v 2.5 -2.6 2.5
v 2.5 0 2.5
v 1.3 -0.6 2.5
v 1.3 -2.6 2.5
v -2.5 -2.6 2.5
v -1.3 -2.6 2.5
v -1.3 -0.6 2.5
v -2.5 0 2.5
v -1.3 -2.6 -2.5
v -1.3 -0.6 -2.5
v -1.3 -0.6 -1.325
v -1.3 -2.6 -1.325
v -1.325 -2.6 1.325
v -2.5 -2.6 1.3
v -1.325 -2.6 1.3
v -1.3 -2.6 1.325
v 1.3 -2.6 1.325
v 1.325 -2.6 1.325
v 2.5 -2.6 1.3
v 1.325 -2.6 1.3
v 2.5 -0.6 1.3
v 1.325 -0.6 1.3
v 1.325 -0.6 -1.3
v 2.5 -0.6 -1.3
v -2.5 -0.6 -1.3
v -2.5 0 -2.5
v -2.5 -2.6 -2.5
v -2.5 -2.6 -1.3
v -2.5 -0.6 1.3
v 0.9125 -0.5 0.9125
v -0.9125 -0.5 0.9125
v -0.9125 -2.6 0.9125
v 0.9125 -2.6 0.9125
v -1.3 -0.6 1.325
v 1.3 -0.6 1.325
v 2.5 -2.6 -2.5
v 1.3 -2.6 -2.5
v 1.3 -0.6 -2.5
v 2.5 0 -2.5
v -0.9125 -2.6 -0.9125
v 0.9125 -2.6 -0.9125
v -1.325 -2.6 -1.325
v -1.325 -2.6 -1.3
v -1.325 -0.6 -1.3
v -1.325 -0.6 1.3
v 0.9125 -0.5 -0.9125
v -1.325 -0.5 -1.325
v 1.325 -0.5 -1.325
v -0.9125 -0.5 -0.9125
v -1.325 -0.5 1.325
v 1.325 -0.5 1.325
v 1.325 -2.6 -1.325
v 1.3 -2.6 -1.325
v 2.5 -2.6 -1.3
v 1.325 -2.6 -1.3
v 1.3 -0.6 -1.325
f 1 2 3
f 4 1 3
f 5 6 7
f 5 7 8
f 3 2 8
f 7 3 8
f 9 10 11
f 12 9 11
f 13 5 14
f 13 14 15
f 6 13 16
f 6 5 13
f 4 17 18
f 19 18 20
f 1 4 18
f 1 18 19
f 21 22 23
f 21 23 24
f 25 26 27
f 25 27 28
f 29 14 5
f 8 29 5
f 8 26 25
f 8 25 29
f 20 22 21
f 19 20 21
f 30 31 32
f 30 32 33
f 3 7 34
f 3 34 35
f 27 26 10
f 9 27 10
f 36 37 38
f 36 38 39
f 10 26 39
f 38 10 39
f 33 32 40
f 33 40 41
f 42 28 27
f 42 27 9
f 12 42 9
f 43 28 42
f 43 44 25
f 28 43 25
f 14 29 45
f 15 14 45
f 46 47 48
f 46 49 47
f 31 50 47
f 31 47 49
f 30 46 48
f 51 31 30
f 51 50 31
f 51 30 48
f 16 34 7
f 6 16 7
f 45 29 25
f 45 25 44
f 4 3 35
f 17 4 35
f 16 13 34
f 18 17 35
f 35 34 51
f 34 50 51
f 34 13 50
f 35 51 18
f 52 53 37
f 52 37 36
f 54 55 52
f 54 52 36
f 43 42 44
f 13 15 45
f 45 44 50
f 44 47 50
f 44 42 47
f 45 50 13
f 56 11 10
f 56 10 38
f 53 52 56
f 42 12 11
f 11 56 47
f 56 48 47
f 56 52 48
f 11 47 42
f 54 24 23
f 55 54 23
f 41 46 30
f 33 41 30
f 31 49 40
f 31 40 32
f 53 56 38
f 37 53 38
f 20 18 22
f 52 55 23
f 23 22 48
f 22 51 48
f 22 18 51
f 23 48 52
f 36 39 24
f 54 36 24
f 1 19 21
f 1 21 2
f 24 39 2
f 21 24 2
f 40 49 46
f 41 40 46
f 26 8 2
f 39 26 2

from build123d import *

# Parameters (mm, degrees)
F0_W      = 5
F0_H      = 5
F1_DEPTH  = 0.5
F2_W      = 1.825
F2_H      = 1.825
F3_DEPTH  = 2.1
F5_DEPTH  = 2.1
F6_W      = 2.6
F6_H      = 1.175
F7_DEPTH  = 0.1
F9_DEPTH  = 2.1
F10_W     = 1.175
F10_H     = 2.6
F11_DEPTH = 0.1
F13_DEPTH = 2.1
F14_W     = 2.6
F14_H     = 1.175
F15_DEPTH = 0.1
F17_DEPTH = 2.1
F18_W     = 1.175
F18_H     = 2.6
F19_DEPTH = 0.1


with BuildPart() as f1:
    # F0 (on Front) → F1 (new body)
    with BuildSketch(Plane.XZ):
        Rectangle(F0_W, F0_H)
    extrude(amount=F1_DEPTH)

    # F2 (on face) → F3 (join)
    with BuildSketch(Plane.XZ.offset(0.5)):
        Rectangle(F2_W, F2_H)
    extrude(amount=F3_DEPTH)

    # F4 (on face) → F5 (join)
    with BuildSketch(Plane.XZ.offset(0.5)):
        Polygon((-2.5, -1.3), (-2.5, -2.5), (-1.3, -2.5), (-1.3, -1.325), (-1.325, -1.325), (-1.325, -1.3), align=None)
    extrude(amount=F5_DEPTH)

    # F6 (on face) → F7 (join)
    with BuildSketch(Plane.XZ.offset(0.5)):
        with Locations((0, -1.9125)):
            Rectangle(F6_W, F6_H)
    extrude(amount=F7_DEPTH)

    # F8 (on face) → F9 (join)
    with BuildSketch(Plane.XZ.offset(0.5)):
        Polygon((1.3, -1.325), (1.3, -2.5), (2.5, -2.5), (2.5, -1.3), (1.325, -1.3), (1.325, -1.325), align=None)
    extrude(amount=F9_DEPTH)

    # F10 (on face) → F11 (join)
    with BuildSketch(Plane.XZ.offset(0.5)):
        with Locations((1.9125, 0)):
            Rectangle(F10_W, F10_H)
    extrude(amount=F11_DEPTH)

    # F12 (on face) → F13 (join)
    with BuildSketch(Plane.XZ.offset(0.5)):
        Polygon((1.325, 1.325), (1.325, 1.3), (2.5, 1.3), (2.5, 2.5), (1.3, 2.5), (1.3, 1.325), align=None)
    extrude(amount=F13_DEPTH)

    # F14 (on face) → F15 (join)
    with BuildSketch(Plane.XZ.offset(0.5)):
        with Locations((0, 1.9125)):
            Rectangle(F14_W, F14_H)
    extrude(amount=F15_DEPTH)

    # F16 (on face) → F17 (join)
    with BuildSketch(Plane.XZ.offset(0.5)):
        Polygon((-1.3, 1.325), (-1.3, 2.5), (-2.5, 2.5), (-2.5, 1.3), (-1.325, 1.3), (-1.325, 1.325), align=None)
    extrude(amount=F17_DEPTH)

    # F18 (on face) → F19 (join)
    with BuildSketch(Plane.XZ.offset(0.5)):
        with Locations((-1.9125, 0)):
            Rectangle(F18_W, F18_H)
    extrude(amount=F19_DEPTH)


solid = f1.part
